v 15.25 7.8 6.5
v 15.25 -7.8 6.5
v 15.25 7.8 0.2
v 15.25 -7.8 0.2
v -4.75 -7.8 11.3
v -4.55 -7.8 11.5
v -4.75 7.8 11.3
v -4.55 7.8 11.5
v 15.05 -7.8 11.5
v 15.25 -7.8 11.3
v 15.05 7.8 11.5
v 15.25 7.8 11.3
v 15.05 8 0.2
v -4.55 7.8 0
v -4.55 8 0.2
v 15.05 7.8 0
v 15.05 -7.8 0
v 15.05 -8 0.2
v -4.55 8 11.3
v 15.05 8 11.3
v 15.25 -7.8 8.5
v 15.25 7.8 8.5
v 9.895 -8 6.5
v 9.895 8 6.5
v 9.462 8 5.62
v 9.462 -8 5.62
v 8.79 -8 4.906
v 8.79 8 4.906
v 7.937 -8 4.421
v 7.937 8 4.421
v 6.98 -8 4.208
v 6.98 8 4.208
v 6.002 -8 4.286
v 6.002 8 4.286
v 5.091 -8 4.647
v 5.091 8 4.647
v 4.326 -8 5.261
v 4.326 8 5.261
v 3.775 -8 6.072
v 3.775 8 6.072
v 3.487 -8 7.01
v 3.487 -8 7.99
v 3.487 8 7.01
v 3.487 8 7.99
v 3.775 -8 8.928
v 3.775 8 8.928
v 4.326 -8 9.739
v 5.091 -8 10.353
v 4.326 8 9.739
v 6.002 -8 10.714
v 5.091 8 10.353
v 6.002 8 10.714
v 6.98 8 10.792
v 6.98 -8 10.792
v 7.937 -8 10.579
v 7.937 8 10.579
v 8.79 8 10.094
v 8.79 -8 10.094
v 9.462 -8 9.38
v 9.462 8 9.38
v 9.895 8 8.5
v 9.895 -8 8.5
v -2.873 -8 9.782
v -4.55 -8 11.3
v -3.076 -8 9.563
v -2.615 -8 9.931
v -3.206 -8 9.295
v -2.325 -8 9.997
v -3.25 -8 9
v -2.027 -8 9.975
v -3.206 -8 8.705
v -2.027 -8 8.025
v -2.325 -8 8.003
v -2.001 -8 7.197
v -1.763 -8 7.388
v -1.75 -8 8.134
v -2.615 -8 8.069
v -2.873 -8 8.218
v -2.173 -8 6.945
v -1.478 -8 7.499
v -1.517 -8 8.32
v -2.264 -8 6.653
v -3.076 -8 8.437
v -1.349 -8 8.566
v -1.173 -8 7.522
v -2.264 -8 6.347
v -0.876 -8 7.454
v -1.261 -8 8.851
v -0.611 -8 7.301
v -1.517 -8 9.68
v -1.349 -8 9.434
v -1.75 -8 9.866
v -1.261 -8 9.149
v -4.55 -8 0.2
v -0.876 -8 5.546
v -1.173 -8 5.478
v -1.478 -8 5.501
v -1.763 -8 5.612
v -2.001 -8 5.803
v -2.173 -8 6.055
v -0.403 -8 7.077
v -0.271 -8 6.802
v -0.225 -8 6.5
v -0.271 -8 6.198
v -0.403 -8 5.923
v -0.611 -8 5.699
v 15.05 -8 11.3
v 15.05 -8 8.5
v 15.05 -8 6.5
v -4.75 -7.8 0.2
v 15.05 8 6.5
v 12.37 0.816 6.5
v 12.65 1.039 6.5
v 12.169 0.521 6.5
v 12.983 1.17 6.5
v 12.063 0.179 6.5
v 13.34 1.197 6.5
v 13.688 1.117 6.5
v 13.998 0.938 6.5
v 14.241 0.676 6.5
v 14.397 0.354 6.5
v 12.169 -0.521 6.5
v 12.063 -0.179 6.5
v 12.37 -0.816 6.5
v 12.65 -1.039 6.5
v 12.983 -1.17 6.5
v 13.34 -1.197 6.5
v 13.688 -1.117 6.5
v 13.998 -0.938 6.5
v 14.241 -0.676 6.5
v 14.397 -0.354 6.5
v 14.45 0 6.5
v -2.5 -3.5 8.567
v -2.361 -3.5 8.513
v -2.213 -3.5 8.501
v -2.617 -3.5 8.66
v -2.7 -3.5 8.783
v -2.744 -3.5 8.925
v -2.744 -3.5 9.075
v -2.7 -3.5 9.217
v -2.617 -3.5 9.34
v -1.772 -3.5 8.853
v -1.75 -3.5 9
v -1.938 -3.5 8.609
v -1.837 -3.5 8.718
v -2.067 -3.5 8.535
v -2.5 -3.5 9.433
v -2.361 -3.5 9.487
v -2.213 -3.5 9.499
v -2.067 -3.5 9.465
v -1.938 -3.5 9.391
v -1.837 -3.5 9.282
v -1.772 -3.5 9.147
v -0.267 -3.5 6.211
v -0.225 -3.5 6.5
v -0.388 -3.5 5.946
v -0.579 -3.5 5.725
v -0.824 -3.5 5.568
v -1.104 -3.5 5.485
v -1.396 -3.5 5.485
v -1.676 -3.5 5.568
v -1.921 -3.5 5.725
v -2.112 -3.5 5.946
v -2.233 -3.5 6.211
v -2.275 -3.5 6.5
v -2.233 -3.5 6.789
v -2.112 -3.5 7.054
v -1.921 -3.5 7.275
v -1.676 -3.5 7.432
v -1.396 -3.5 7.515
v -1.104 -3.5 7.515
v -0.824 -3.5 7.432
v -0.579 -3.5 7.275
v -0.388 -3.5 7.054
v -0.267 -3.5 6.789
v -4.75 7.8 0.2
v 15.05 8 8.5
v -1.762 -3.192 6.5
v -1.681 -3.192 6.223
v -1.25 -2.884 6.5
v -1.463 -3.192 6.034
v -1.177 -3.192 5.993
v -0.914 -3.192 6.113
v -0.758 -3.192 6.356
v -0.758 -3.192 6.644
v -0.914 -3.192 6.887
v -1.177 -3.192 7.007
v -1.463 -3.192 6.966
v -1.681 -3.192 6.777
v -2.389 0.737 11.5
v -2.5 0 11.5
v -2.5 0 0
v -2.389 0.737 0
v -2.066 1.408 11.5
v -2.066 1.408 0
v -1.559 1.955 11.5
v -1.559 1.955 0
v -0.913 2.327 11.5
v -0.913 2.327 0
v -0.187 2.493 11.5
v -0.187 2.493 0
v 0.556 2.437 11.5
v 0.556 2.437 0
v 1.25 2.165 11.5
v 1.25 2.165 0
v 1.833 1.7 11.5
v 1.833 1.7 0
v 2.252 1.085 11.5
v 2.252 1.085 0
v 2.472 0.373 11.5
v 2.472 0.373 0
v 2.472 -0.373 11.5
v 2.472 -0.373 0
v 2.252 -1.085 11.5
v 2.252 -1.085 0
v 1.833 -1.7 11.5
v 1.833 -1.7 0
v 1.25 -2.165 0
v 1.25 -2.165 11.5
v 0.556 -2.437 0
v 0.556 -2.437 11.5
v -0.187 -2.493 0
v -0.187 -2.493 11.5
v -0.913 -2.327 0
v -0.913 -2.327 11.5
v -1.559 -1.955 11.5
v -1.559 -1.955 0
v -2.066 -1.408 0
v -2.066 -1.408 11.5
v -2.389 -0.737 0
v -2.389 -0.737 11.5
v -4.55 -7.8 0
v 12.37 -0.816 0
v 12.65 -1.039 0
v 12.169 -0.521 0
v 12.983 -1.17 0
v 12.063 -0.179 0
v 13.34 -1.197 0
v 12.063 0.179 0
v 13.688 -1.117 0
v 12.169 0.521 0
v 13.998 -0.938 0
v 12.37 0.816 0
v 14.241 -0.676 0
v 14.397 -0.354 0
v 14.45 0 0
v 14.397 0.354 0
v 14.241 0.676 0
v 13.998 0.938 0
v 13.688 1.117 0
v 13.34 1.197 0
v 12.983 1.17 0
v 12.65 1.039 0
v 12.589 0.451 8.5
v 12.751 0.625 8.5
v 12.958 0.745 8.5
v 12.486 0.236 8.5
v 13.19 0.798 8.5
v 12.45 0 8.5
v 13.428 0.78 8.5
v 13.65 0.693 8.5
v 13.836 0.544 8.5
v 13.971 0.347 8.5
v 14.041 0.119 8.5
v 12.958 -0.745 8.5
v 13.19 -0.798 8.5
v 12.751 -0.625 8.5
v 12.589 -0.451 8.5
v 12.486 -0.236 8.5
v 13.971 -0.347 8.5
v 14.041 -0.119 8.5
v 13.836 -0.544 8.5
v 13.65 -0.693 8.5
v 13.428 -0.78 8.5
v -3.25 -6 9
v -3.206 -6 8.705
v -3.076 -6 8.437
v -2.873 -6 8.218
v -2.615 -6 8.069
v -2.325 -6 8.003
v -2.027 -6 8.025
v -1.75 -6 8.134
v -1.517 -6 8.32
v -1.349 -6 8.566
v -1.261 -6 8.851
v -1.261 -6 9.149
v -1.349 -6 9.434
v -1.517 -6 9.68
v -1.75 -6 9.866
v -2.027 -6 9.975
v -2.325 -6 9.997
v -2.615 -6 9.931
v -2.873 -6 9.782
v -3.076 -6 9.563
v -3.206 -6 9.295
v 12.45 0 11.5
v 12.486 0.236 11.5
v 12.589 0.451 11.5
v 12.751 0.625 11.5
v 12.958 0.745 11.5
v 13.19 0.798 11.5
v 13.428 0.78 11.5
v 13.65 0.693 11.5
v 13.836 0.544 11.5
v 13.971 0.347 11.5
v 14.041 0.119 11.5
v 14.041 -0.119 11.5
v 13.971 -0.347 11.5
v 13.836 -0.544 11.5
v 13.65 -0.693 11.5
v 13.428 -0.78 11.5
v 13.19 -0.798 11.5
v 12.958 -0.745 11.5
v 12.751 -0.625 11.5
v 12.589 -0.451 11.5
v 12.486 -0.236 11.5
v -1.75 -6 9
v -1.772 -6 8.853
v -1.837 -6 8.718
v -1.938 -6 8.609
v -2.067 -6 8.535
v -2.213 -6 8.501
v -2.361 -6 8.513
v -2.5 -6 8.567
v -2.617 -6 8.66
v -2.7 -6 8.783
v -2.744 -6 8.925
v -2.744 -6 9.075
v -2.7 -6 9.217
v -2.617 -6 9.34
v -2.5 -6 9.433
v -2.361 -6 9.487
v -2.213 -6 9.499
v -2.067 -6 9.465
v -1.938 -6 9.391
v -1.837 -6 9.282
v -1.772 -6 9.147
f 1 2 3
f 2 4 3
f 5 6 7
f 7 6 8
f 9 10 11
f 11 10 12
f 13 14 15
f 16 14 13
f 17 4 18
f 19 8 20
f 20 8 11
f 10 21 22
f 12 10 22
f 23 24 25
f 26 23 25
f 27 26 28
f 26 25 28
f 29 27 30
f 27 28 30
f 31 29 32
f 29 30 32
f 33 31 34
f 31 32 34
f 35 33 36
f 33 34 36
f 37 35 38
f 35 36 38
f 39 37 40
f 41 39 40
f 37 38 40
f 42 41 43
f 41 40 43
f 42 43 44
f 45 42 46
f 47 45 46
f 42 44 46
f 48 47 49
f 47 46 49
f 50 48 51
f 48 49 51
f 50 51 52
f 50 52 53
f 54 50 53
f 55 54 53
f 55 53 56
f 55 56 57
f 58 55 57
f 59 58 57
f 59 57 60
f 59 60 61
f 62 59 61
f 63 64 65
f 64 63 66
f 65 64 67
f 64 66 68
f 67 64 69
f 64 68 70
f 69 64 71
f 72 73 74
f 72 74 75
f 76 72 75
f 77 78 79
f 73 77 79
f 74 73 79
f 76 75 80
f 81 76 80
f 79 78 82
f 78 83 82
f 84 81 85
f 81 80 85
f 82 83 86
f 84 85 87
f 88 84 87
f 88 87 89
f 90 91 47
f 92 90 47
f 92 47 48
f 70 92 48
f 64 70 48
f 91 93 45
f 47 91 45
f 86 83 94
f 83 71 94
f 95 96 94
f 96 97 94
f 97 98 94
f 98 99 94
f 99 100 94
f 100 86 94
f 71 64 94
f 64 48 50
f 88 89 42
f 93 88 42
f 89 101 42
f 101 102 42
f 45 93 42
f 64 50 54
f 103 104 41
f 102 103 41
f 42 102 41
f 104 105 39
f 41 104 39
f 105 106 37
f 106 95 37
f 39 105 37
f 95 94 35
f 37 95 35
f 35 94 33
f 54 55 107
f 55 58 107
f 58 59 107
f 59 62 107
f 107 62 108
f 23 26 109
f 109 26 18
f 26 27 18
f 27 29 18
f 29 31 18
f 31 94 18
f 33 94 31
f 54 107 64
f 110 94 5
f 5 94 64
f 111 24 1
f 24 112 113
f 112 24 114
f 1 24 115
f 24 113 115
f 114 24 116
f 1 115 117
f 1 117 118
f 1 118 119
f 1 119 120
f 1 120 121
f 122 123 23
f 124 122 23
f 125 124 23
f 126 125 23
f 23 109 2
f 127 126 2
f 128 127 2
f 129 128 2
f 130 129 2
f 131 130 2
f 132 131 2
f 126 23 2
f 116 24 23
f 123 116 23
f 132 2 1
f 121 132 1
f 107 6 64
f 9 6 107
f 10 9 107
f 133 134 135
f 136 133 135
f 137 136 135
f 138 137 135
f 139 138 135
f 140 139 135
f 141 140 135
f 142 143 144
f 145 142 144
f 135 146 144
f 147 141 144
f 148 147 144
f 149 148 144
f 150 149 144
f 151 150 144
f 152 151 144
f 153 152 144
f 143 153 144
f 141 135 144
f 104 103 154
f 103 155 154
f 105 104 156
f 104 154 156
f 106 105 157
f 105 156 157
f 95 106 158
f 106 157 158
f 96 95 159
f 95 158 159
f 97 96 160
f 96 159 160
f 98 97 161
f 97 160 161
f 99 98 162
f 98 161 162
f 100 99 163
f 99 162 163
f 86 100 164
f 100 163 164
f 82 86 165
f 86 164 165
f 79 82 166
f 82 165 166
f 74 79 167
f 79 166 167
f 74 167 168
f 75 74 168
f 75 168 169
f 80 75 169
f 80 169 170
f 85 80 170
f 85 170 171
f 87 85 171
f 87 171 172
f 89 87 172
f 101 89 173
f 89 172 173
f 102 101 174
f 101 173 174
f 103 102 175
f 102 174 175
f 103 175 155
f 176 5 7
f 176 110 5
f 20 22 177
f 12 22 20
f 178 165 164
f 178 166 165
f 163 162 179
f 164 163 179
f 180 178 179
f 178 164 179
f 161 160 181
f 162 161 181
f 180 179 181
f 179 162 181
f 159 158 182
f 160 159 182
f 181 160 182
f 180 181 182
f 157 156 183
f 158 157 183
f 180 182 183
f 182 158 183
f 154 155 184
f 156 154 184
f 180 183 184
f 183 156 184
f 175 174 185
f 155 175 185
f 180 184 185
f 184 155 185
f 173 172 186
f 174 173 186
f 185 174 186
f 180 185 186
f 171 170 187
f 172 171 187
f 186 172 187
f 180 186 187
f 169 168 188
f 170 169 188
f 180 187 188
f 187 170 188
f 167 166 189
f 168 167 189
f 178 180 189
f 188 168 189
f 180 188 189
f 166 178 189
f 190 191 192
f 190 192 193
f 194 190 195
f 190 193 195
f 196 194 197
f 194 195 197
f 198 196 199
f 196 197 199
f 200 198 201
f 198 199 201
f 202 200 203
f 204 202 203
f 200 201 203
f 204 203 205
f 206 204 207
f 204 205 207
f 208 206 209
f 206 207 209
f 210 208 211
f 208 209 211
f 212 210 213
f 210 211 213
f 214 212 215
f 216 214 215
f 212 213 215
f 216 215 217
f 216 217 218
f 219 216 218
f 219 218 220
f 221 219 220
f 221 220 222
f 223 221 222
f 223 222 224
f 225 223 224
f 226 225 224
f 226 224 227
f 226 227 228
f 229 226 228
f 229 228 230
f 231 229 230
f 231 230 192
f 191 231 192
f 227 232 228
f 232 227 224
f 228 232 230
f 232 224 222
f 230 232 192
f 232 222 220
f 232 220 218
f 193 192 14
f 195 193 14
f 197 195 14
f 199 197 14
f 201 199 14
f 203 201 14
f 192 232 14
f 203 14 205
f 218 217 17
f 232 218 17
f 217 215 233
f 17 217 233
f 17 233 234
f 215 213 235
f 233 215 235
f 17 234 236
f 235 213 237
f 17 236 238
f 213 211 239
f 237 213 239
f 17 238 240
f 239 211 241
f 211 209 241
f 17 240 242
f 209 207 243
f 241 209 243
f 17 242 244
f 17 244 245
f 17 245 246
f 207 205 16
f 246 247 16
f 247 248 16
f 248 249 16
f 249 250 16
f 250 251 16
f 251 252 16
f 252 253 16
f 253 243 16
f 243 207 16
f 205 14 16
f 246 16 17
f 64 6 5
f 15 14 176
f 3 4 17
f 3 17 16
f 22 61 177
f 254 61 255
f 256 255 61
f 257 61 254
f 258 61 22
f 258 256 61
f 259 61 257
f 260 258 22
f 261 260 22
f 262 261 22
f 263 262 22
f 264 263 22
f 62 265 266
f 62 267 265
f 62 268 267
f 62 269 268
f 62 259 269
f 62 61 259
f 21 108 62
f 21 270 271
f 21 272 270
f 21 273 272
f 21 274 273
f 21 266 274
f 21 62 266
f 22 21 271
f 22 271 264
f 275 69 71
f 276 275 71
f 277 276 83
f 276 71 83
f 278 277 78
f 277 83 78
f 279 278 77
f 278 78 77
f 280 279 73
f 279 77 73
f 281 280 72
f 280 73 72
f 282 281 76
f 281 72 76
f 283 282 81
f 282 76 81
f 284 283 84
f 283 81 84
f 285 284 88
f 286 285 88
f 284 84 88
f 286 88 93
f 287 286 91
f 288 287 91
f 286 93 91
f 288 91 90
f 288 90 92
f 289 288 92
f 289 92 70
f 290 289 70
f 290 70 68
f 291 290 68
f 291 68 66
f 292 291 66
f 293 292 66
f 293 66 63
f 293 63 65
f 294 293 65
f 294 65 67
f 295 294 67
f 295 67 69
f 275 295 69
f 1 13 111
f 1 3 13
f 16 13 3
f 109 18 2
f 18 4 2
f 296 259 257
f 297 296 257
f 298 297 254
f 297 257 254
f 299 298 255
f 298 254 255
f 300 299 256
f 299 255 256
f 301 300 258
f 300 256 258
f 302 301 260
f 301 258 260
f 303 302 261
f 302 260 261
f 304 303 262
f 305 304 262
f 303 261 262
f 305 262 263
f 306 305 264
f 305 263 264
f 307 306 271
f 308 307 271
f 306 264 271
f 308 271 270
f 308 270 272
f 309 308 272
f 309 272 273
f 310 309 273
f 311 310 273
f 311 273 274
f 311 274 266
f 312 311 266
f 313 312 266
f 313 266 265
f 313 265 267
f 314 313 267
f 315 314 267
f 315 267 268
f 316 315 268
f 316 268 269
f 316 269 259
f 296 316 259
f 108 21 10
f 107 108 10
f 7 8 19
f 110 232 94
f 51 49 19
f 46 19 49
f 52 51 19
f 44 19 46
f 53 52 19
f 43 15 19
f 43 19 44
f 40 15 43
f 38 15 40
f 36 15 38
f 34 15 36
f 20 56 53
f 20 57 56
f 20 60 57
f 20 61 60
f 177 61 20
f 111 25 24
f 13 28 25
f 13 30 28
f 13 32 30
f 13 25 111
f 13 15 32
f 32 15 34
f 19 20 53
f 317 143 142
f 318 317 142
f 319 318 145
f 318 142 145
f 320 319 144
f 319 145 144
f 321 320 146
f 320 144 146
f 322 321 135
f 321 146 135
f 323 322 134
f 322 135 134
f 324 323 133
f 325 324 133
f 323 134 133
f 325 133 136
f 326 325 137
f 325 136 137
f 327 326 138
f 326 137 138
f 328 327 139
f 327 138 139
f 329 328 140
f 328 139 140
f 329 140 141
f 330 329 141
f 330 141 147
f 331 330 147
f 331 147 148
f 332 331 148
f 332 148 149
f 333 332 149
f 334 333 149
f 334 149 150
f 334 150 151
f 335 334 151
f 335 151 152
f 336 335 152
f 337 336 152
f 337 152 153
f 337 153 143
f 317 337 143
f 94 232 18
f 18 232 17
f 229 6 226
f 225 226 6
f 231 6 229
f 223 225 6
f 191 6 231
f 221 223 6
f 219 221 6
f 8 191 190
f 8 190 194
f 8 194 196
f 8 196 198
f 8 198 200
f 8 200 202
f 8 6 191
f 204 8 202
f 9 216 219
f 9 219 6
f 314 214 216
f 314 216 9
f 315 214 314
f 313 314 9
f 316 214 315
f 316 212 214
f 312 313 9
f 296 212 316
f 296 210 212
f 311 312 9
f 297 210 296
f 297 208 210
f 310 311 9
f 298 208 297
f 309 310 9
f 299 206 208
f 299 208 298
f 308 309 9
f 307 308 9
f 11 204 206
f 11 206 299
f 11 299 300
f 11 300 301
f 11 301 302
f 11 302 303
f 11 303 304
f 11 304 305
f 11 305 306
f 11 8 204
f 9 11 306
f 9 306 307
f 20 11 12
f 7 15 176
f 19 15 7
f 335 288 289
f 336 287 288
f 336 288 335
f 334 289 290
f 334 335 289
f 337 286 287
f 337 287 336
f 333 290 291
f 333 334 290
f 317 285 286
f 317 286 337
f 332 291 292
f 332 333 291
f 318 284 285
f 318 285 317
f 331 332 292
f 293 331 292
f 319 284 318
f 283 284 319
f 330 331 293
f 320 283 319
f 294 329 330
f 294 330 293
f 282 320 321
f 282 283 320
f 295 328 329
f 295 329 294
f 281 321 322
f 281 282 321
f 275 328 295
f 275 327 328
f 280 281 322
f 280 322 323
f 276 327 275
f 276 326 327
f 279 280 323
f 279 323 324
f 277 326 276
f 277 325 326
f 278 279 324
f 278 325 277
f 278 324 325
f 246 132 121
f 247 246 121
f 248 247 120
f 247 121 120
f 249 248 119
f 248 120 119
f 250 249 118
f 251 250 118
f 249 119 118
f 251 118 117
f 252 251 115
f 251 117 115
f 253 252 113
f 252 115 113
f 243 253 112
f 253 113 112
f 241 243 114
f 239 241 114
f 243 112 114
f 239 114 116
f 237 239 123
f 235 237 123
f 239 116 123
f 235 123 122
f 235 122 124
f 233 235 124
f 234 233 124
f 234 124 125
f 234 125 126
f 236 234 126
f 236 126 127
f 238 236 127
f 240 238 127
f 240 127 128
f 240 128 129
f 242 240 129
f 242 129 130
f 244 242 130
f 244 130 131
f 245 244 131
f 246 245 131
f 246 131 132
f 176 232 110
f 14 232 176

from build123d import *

# Parameters (mm, degrees)
ESQUISSE1_W             = 20
ESQUISSE1_H             = 16
BOSS_EXTRU_1_DEPTH      = 11.5
TROU_TARAUD_M61_D       = 5
PER_AGE1_D              = 1
PER_AGE1_DEPTH          = 4.5
PER_AGE1_CBORE_D        = 2
PER_AGE1_CBORE_DEPTH    = 2
TROU_TARAUD_M2_51_D     = 2.05
TROU_TARAUD_M2_51_DEPTH = 4.5
TROU_TARAUD_M2_51_TIP   = 0.615882135
D_GAGEMENT_M61_D        = 6.6
ESQUISSE10_W            = 11.487199582
ESQUISSE10_H            = 2
ENL_V_MAT_EXTRU_1_DEPTH = 25.916109247
TROU_TARAUD_M21_D       = 1.6
TROU_TARAUD_M21_DEPTH   = 3
D_GAGEMENT_M21_D        = 2.4
D_GAGEMENT_M21_DEPTH    = 6.5
CHANFREIN1_SIZE         = 0.2


with BuildPart() as part:
    # Esquisse1 → Boss.-Extru.1 (new body)
    with BuildSketch(Plane.XY):
        with Locations((5.25, 0)):
            Rectangle(ESQUISSE1_W, ESQUISSE1_H)
    extrude(amount=BOSS_EXTRU_1_DEPTH)

    # Trou taraudé M61 (through all)
    with Locations(Plane.XY.offset(11.5)):
        with Locations((0, 0)):
            Hole(TROU_TARAUD_M61_D / 2)

    # Perçage1
    with Locations(Plane(origin=(0, -8, 0), x_dir=(-1, 0, 0), z_dir=(0, -1, 0))):
        with Locations((2.25, -9)):
            CounterBoreHole(PER_AGE1_D / 2, PER_AGE1_CBORE_D / 2, PER_AGE1_CBORE_DEPTH, depth=PER_AGE1_DEPTH)

    # Trou taraudé M2.51
    with Locations(Plane(origin=(0, -8, 0), x_dir=(-1, 0, 0), z_dir=(0, -1, 0))):
        with Locations((1.25, -6.5)):
            Hole(TROU_TARAUD_M2_51_D / 2, depth=TROU_TARAUD_M2_51_DEPTH)
            with Locations((0, 0, -(TROU_TARAUD_M2_51_DEPTH + TROU_TARAUD_M2_51_TIP / 2))):  # 118° drill point
                Cone(0, TROU_TARAUD_M2_51_D / 2, TROU_TARAUD_M2_51_TIP, mode=Mode.SUBTRACT)

    # Dégagement M61 (through all)
    with Locations(Plane(origin=(0, -8, 0), x_dir=(-1, 0, 0), z_dir=(0, -1, 0))):
        with Locations((-6.75, -7.5)):
            Hole(D_GAGEMENT_M61_D / 2)

    # Esquisse10 → Enlèv. mat.-Extru.1 (cut, through all)
    with BuildSketch(Plane.XZ.offset(8)):
        with Locations((12.493599791, 7.5)):
            Rectangle(ESQUISSE10_W, ESQUISSE10_H)
    extrude(amount=-ENL_V_MAT_EXTRU_1_DEPTH, mode=Mode.SUBTRACT)

    # Trou taraudé M21
    with Locations(Plane.XY.offset(11.5)):
        with Locations((13.25, 0)):
            Hole(TROU_TARAUD_M21_D / 2, depth=TROU_TARAUD_M21_DEPTH)

    # Dégagement M21
    with Locations(Plane(origin=(0, 0, 0), x_dir=(-1, 0, 0), z_dir=(0, 0, -1))):
        with Locations((-13.25, 0)):
            Hole(D_GAGEMENT_M21_D / 2, depth=D_GAGEMENT_M21_DEPTH)

    # Chanfrein1
    chanfrein1_edges = [part.edges().sort_by_distance(p)[0] for p in [
        (15.25, 0, 11.5),
        (5.25, 8, 11.5),
        (15.25, 8, 3.25),
        (15.25, -8, 3.25),
        (-4.75, 0, 11.5),
        (5.25, 8, 0),
        (15.25, 0, 0),
        (5.25, -8, 0),
        (-4.75, 0, 0),
        (5.25, -8, 11.5),
        (-4.75, 8, 5.75),
        (15.25, 8, 10),
        (15.25, -8, 10),
        (-4.75, -8, 5.75),
    ]]
    chamfer(chanfrein1_edges, length=CHANFREIN1_SIZE)


solid = part.part
